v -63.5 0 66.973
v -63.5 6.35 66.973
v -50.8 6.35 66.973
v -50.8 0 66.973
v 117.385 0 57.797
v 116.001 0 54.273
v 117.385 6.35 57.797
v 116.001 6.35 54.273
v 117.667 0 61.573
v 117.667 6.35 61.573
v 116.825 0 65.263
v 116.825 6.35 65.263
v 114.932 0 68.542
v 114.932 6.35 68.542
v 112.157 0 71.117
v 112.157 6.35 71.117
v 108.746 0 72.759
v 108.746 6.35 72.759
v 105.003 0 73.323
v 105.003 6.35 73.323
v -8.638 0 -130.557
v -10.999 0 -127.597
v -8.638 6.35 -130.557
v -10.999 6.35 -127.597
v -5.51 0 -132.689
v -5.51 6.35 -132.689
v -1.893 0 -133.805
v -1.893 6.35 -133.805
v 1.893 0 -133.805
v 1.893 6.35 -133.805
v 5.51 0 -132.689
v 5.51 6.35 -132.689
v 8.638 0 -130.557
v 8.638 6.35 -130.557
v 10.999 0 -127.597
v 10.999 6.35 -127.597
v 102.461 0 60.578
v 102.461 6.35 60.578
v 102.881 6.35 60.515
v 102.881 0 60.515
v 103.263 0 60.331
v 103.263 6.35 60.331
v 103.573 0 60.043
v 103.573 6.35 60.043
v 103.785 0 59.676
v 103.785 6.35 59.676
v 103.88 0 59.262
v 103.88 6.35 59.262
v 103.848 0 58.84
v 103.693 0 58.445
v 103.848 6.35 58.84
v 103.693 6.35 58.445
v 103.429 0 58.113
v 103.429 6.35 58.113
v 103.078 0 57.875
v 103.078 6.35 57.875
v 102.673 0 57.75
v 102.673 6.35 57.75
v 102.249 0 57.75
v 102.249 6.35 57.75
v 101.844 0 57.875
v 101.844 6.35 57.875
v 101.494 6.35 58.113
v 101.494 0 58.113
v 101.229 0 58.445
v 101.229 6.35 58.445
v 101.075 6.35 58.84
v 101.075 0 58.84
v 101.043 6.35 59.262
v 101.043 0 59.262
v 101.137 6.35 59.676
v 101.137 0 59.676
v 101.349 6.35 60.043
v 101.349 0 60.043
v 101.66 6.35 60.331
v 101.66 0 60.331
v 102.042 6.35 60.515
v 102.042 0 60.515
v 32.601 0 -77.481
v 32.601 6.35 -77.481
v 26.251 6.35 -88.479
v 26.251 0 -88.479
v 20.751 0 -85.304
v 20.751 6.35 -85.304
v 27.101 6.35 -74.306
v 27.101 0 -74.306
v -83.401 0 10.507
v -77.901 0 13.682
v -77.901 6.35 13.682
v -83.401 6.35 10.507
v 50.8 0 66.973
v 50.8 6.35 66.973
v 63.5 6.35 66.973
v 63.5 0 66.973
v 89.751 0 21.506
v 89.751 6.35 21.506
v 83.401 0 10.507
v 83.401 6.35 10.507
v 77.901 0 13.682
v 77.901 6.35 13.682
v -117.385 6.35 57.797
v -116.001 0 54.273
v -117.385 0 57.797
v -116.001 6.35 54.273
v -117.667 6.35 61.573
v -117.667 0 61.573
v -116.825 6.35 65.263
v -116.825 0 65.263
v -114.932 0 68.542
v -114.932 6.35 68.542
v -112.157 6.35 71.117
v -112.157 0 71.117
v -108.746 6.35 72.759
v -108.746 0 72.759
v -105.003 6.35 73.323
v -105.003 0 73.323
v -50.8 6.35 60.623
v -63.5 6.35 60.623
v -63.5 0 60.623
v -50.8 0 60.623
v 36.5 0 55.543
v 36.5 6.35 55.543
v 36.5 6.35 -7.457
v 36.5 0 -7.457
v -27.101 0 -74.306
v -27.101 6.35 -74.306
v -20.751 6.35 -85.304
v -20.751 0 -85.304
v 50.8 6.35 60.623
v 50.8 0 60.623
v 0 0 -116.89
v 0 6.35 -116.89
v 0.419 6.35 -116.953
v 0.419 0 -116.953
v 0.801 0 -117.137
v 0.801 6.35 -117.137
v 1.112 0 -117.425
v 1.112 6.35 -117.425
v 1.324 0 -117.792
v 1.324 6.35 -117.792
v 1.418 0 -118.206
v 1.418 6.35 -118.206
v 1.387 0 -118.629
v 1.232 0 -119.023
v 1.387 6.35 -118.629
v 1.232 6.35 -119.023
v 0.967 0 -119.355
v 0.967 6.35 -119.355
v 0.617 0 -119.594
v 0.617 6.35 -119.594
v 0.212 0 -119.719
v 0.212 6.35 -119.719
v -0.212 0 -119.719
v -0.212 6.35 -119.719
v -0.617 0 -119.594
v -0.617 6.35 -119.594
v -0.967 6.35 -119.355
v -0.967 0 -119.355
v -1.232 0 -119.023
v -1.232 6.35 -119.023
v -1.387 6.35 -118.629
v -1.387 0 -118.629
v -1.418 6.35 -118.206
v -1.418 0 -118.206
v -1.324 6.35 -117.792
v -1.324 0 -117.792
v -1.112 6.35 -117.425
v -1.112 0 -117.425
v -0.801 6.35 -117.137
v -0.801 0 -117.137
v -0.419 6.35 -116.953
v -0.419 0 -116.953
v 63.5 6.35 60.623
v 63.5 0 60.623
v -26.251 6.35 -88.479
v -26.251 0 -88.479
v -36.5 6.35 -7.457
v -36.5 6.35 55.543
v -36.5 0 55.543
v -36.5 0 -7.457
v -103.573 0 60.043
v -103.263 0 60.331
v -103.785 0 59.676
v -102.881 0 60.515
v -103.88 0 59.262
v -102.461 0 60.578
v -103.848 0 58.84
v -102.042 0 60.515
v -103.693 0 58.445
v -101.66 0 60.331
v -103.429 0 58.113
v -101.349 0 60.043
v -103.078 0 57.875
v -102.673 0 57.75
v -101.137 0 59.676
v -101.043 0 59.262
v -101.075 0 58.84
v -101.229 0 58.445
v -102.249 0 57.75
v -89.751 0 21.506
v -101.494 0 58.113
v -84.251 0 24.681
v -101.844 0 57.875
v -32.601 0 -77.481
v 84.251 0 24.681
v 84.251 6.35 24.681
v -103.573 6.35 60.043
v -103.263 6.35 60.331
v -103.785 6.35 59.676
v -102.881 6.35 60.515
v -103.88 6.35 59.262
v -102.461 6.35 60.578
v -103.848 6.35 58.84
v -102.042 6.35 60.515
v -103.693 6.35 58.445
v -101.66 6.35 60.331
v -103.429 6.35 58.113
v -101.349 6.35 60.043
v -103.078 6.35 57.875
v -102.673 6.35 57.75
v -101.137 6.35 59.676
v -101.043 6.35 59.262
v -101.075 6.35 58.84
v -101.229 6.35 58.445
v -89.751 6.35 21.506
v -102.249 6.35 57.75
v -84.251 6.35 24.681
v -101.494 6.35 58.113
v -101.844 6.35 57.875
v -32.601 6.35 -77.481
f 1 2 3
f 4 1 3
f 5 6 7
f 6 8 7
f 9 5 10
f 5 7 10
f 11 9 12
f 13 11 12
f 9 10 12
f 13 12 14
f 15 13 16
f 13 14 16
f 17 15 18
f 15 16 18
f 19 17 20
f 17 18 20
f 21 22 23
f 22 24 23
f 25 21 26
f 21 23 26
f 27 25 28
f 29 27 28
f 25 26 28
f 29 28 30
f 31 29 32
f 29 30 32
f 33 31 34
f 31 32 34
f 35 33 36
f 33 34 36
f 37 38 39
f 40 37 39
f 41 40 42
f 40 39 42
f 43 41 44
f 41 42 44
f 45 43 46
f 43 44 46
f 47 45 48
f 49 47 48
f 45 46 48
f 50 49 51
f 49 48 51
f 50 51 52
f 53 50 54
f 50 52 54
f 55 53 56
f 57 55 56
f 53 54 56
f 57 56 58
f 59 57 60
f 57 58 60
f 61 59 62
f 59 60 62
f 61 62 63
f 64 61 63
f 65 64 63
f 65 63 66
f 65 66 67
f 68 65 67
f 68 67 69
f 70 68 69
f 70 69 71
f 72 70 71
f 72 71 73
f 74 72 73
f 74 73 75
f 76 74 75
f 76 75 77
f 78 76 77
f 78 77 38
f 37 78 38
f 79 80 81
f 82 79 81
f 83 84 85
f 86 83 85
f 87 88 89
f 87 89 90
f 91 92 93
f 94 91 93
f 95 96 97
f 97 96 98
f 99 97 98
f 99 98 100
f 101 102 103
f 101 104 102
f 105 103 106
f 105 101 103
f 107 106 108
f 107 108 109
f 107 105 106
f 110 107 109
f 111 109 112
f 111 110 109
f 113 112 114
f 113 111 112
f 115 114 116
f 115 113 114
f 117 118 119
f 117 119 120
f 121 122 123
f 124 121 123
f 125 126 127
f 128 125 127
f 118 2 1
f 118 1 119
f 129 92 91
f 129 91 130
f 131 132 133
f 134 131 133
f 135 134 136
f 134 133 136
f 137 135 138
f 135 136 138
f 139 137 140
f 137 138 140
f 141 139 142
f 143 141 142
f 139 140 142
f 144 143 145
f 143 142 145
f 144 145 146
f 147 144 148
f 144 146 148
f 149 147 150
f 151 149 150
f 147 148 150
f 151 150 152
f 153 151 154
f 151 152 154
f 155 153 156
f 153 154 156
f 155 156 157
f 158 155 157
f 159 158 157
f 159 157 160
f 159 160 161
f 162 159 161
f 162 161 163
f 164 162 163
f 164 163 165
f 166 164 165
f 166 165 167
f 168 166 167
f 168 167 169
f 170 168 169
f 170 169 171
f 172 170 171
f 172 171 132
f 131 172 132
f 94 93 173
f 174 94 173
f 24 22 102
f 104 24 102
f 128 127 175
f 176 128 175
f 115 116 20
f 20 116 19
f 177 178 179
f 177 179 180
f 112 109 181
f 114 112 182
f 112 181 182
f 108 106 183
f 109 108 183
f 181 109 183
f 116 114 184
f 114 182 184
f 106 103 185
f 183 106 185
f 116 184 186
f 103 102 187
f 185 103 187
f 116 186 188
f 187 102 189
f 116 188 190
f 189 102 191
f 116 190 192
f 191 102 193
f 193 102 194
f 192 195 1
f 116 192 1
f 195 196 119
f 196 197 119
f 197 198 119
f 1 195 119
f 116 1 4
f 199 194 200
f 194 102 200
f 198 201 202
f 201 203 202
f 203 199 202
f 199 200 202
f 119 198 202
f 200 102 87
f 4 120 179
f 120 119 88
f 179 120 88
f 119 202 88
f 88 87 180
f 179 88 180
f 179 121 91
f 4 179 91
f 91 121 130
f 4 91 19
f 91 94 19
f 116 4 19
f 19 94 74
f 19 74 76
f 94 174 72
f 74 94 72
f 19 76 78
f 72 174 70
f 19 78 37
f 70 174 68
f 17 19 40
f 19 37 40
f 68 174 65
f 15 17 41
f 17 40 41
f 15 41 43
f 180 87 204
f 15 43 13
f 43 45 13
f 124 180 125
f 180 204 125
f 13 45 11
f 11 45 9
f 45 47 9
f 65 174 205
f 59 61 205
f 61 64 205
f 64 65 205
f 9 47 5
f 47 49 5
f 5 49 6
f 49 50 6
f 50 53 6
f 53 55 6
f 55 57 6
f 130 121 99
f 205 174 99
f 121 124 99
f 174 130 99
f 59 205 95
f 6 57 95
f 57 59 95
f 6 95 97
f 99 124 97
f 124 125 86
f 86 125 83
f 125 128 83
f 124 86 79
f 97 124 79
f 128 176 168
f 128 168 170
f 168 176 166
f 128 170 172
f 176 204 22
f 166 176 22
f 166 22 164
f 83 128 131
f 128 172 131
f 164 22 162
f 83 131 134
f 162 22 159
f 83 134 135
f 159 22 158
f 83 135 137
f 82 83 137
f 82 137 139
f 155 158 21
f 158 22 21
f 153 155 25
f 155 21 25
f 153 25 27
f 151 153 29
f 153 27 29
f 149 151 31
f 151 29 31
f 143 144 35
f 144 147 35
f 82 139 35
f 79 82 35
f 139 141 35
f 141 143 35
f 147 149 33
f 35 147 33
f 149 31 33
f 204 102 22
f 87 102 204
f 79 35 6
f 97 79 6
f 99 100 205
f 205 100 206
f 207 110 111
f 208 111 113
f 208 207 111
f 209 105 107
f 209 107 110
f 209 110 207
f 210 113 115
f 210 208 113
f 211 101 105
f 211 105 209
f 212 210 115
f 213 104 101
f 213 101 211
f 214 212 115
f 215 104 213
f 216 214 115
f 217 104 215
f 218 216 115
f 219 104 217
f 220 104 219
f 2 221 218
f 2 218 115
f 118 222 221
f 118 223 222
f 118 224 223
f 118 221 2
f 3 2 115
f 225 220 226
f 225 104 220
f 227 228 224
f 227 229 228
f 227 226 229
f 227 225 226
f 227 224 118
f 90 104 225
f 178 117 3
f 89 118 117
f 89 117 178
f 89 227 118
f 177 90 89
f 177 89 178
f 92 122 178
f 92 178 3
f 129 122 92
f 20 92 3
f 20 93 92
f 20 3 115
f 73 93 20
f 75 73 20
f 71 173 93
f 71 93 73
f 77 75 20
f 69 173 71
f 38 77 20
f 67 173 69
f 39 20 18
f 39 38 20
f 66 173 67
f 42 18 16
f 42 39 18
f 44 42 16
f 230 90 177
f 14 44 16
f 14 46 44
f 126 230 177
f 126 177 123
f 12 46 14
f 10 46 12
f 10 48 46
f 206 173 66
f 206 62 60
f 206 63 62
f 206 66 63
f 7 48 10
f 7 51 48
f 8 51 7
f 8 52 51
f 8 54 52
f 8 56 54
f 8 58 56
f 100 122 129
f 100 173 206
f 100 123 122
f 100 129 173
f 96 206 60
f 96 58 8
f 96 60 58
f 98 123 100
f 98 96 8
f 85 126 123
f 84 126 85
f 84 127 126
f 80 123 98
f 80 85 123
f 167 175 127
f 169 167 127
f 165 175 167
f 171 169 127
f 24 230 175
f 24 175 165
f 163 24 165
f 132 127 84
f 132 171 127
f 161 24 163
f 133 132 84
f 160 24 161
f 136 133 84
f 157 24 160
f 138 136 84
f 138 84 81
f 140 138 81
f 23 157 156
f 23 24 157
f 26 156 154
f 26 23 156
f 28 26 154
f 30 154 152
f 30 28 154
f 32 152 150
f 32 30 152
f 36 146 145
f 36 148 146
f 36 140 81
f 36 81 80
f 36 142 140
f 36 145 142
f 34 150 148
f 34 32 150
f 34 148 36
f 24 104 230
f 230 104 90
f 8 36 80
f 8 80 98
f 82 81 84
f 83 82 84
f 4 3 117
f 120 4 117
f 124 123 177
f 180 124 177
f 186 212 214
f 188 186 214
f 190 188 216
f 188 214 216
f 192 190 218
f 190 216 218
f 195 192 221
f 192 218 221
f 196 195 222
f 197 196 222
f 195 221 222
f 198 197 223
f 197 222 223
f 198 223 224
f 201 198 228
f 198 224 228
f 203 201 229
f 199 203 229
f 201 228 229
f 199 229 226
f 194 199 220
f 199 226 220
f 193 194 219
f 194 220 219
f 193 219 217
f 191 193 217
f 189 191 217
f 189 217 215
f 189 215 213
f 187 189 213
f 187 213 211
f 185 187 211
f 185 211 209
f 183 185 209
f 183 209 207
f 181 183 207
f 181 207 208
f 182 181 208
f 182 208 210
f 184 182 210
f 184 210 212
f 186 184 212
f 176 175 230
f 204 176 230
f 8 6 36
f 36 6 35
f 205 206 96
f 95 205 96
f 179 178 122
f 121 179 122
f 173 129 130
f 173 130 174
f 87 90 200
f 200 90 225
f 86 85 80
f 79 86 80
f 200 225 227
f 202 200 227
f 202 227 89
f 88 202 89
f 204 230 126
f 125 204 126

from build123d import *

# Parameters (mm, degrees)
BOSS_EXTRUDE1_DEPTH = 6.35
SKETCH2_W           = 36.5
SKETCH2_H           = 63
SKETCH2_R           = 1.4224
CUT_EXTRUDE2_DEPTH  = 195.099602868
FILLET1_R           = 12.7
SKETCH3_W           = 12.7
SKETCH3_H           = 6.35
CUT_EXTRUDE3_DEPTH  = 179.426731159


with BuildPart() as part:
    # Sketch1 → Boss-Extrude1 (new body)
    with BuildSketch(Plane(origin=(0, 0, 0), x_dir=(1, 0, 0), z_dir=(0, 1, 0))):
        Polygon((0, 146.646968374), (-127, -73.323484187), (127, -73.323484187), align=None)
    extrude(amount=BOSS_EXTRUDE1_DEPTH)

    # Sketch2 → Cut-Extrude2 (cut, through all)
    with BuildSketch(Plane(origin=(0, 6.35, 0), x_dir=(1, 0, 0), z_dir=(0, 1, 0))):
        with Locations((-18.25, -24.043484187)):
            Rectangle(SKETCH2_W, SKETCH2_H)
        with Locations((18.25, -24.043484187)):
            Rectangle(SKETCH2_W, SKETCH2_H)
        with Locations(Location((0, 118.312139176, 0), (0, 0, 270))):
            Circle(SKETCH2_R)
        with Locations(Location((-102.461318102, -59.156069588, 0), (0, 0, 270))):
            Circle(SKETCH2_R)
        with Locations(Location((102.461318102, -59.156069588, 0), (0, 0, 270))):
            Circle(SKETCH2_R)
    extrude(amount=-CUT_EXTRUDE2_DEPTH, mode=Mode.SUBTRACT)

    # Fillet1
    fillet1_edges = [part.edges().sort_by_distance(p)[0] for p in [
        (127, 3.175, 73.323484187),
        (-127, 3.175, 73.323484187),
        (0, 3.175, -146.646968374),
    ]]
    fillet(fillet1_edges, radius=FILLET1_R)

    # Sketch3 → Cut-Extrude3 (cut, through all)
    with BuildSketch(Plane(origin=(0, 6.35, 0), x_dir=(1, 0, 0), z_dir=(0, 1, 0))):
        Polygon((-26.250738686, 88.479355234), (-32.600738686, 77.480832606), (-27.101477372, 74.305832606), (-20.751477372, 85.304355234), align=None)
        Polygon((-77.901477372, -13.682348419), (-83.400738686, -10.507348419), (-89.750738686, -21.505871047), (-84.251477372, -24.680871047), align=None)
        with Locations((-57.15, -63.798484187)):
            Rectangle(SKETCH3_W, SKETCH3_H)
        with Locations((57.15, -63.798484187)):
            Rectangle(SKETCH3_W, SKETCH3_H)
        Polygon((89.750738686, -21.505871047), (83.400738686, -10.507348419), (77.901477372, -13.682348419), (84.251477372, -24.680871047), align=None)
        Polygon((27.101477372, 74.305832606), (32.600738686, 77.480832606), (26.250738686, 88.479355234), (20.751477372, 85.304355234), align=None)
    extrude(amount=-CUT_EXTRUDE3_DEPTH, mode=Mode.SUBTRACT)


solid = part.part
